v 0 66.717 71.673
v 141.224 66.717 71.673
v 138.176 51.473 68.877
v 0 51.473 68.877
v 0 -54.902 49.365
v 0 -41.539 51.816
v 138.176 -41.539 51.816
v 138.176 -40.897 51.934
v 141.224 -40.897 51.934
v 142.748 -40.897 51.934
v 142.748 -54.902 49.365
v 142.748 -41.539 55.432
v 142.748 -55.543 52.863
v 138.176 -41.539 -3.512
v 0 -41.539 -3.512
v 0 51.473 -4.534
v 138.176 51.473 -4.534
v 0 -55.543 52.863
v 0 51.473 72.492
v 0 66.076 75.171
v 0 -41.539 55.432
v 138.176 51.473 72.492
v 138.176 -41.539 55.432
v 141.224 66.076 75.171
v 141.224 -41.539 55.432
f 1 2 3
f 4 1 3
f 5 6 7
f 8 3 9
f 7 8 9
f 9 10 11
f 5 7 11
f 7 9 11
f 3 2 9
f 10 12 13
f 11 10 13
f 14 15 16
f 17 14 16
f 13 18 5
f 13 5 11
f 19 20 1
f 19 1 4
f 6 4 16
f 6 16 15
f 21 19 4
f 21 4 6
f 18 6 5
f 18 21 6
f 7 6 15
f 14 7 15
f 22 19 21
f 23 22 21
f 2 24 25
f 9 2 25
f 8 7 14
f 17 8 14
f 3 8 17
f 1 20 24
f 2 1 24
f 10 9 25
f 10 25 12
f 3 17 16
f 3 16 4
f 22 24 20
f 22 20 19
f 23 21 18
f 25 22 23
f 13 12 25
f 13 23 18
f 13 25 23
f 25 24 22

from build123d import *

# Parameters (mm, degrees)
F1_DEPTH = 138.176
F2_E3_W  = 14.2383185016
F2_E3_H  = 142.748
F3_DEPTH = 3.556
F4_E2_W  = 109.4098263908
F4_E2_H  = 141.224
F5_DEPTH = 3.556


with BuildPart() as f1:
    # F0 (on Right) → F1 (new body)
    with BuildSketch(Plane.YZ):
        Polygon((51.4731071889, 72.4924988879), (-41.5385216475, 55.4317318249), (-41.5385216475, -3.5118000333), (51.4731071889, -4.5339060016), align=None)
    extrude(amount=F1_DEPTH)

    # F2_E3 (on explicit) → F3 (join)
    with BuildSketch(Plane(origin=(0, -41.5385216475, 55.4317318249), x_dir=(0, -0.9835903566, -0.1804162143), z_dir=(0, -0.1804162143, 0.9835903566))):
        with Locations((7.1191592508, 71.374)):
            Rectangle(F2_E3_W, F2_E3_H)
    extrude(amount=-F3_DEPTH)

    # F4_E2 (on explicit) → F5 (join)
    with BuildSketch(Plane(origin=(0, 66.0759285092, 75.1710385084), x_dir=(0, -0.9835903566, -0.1804162143), z_dir=(0, -0.1804162143, 0.9835903566))):
        with Locations((54.7049131954, 70.612)):
            Rectangle(F4_E2_W, F4_E2_H)
    extrude(amount=-F5_DEPTH)


solid = f1.part
